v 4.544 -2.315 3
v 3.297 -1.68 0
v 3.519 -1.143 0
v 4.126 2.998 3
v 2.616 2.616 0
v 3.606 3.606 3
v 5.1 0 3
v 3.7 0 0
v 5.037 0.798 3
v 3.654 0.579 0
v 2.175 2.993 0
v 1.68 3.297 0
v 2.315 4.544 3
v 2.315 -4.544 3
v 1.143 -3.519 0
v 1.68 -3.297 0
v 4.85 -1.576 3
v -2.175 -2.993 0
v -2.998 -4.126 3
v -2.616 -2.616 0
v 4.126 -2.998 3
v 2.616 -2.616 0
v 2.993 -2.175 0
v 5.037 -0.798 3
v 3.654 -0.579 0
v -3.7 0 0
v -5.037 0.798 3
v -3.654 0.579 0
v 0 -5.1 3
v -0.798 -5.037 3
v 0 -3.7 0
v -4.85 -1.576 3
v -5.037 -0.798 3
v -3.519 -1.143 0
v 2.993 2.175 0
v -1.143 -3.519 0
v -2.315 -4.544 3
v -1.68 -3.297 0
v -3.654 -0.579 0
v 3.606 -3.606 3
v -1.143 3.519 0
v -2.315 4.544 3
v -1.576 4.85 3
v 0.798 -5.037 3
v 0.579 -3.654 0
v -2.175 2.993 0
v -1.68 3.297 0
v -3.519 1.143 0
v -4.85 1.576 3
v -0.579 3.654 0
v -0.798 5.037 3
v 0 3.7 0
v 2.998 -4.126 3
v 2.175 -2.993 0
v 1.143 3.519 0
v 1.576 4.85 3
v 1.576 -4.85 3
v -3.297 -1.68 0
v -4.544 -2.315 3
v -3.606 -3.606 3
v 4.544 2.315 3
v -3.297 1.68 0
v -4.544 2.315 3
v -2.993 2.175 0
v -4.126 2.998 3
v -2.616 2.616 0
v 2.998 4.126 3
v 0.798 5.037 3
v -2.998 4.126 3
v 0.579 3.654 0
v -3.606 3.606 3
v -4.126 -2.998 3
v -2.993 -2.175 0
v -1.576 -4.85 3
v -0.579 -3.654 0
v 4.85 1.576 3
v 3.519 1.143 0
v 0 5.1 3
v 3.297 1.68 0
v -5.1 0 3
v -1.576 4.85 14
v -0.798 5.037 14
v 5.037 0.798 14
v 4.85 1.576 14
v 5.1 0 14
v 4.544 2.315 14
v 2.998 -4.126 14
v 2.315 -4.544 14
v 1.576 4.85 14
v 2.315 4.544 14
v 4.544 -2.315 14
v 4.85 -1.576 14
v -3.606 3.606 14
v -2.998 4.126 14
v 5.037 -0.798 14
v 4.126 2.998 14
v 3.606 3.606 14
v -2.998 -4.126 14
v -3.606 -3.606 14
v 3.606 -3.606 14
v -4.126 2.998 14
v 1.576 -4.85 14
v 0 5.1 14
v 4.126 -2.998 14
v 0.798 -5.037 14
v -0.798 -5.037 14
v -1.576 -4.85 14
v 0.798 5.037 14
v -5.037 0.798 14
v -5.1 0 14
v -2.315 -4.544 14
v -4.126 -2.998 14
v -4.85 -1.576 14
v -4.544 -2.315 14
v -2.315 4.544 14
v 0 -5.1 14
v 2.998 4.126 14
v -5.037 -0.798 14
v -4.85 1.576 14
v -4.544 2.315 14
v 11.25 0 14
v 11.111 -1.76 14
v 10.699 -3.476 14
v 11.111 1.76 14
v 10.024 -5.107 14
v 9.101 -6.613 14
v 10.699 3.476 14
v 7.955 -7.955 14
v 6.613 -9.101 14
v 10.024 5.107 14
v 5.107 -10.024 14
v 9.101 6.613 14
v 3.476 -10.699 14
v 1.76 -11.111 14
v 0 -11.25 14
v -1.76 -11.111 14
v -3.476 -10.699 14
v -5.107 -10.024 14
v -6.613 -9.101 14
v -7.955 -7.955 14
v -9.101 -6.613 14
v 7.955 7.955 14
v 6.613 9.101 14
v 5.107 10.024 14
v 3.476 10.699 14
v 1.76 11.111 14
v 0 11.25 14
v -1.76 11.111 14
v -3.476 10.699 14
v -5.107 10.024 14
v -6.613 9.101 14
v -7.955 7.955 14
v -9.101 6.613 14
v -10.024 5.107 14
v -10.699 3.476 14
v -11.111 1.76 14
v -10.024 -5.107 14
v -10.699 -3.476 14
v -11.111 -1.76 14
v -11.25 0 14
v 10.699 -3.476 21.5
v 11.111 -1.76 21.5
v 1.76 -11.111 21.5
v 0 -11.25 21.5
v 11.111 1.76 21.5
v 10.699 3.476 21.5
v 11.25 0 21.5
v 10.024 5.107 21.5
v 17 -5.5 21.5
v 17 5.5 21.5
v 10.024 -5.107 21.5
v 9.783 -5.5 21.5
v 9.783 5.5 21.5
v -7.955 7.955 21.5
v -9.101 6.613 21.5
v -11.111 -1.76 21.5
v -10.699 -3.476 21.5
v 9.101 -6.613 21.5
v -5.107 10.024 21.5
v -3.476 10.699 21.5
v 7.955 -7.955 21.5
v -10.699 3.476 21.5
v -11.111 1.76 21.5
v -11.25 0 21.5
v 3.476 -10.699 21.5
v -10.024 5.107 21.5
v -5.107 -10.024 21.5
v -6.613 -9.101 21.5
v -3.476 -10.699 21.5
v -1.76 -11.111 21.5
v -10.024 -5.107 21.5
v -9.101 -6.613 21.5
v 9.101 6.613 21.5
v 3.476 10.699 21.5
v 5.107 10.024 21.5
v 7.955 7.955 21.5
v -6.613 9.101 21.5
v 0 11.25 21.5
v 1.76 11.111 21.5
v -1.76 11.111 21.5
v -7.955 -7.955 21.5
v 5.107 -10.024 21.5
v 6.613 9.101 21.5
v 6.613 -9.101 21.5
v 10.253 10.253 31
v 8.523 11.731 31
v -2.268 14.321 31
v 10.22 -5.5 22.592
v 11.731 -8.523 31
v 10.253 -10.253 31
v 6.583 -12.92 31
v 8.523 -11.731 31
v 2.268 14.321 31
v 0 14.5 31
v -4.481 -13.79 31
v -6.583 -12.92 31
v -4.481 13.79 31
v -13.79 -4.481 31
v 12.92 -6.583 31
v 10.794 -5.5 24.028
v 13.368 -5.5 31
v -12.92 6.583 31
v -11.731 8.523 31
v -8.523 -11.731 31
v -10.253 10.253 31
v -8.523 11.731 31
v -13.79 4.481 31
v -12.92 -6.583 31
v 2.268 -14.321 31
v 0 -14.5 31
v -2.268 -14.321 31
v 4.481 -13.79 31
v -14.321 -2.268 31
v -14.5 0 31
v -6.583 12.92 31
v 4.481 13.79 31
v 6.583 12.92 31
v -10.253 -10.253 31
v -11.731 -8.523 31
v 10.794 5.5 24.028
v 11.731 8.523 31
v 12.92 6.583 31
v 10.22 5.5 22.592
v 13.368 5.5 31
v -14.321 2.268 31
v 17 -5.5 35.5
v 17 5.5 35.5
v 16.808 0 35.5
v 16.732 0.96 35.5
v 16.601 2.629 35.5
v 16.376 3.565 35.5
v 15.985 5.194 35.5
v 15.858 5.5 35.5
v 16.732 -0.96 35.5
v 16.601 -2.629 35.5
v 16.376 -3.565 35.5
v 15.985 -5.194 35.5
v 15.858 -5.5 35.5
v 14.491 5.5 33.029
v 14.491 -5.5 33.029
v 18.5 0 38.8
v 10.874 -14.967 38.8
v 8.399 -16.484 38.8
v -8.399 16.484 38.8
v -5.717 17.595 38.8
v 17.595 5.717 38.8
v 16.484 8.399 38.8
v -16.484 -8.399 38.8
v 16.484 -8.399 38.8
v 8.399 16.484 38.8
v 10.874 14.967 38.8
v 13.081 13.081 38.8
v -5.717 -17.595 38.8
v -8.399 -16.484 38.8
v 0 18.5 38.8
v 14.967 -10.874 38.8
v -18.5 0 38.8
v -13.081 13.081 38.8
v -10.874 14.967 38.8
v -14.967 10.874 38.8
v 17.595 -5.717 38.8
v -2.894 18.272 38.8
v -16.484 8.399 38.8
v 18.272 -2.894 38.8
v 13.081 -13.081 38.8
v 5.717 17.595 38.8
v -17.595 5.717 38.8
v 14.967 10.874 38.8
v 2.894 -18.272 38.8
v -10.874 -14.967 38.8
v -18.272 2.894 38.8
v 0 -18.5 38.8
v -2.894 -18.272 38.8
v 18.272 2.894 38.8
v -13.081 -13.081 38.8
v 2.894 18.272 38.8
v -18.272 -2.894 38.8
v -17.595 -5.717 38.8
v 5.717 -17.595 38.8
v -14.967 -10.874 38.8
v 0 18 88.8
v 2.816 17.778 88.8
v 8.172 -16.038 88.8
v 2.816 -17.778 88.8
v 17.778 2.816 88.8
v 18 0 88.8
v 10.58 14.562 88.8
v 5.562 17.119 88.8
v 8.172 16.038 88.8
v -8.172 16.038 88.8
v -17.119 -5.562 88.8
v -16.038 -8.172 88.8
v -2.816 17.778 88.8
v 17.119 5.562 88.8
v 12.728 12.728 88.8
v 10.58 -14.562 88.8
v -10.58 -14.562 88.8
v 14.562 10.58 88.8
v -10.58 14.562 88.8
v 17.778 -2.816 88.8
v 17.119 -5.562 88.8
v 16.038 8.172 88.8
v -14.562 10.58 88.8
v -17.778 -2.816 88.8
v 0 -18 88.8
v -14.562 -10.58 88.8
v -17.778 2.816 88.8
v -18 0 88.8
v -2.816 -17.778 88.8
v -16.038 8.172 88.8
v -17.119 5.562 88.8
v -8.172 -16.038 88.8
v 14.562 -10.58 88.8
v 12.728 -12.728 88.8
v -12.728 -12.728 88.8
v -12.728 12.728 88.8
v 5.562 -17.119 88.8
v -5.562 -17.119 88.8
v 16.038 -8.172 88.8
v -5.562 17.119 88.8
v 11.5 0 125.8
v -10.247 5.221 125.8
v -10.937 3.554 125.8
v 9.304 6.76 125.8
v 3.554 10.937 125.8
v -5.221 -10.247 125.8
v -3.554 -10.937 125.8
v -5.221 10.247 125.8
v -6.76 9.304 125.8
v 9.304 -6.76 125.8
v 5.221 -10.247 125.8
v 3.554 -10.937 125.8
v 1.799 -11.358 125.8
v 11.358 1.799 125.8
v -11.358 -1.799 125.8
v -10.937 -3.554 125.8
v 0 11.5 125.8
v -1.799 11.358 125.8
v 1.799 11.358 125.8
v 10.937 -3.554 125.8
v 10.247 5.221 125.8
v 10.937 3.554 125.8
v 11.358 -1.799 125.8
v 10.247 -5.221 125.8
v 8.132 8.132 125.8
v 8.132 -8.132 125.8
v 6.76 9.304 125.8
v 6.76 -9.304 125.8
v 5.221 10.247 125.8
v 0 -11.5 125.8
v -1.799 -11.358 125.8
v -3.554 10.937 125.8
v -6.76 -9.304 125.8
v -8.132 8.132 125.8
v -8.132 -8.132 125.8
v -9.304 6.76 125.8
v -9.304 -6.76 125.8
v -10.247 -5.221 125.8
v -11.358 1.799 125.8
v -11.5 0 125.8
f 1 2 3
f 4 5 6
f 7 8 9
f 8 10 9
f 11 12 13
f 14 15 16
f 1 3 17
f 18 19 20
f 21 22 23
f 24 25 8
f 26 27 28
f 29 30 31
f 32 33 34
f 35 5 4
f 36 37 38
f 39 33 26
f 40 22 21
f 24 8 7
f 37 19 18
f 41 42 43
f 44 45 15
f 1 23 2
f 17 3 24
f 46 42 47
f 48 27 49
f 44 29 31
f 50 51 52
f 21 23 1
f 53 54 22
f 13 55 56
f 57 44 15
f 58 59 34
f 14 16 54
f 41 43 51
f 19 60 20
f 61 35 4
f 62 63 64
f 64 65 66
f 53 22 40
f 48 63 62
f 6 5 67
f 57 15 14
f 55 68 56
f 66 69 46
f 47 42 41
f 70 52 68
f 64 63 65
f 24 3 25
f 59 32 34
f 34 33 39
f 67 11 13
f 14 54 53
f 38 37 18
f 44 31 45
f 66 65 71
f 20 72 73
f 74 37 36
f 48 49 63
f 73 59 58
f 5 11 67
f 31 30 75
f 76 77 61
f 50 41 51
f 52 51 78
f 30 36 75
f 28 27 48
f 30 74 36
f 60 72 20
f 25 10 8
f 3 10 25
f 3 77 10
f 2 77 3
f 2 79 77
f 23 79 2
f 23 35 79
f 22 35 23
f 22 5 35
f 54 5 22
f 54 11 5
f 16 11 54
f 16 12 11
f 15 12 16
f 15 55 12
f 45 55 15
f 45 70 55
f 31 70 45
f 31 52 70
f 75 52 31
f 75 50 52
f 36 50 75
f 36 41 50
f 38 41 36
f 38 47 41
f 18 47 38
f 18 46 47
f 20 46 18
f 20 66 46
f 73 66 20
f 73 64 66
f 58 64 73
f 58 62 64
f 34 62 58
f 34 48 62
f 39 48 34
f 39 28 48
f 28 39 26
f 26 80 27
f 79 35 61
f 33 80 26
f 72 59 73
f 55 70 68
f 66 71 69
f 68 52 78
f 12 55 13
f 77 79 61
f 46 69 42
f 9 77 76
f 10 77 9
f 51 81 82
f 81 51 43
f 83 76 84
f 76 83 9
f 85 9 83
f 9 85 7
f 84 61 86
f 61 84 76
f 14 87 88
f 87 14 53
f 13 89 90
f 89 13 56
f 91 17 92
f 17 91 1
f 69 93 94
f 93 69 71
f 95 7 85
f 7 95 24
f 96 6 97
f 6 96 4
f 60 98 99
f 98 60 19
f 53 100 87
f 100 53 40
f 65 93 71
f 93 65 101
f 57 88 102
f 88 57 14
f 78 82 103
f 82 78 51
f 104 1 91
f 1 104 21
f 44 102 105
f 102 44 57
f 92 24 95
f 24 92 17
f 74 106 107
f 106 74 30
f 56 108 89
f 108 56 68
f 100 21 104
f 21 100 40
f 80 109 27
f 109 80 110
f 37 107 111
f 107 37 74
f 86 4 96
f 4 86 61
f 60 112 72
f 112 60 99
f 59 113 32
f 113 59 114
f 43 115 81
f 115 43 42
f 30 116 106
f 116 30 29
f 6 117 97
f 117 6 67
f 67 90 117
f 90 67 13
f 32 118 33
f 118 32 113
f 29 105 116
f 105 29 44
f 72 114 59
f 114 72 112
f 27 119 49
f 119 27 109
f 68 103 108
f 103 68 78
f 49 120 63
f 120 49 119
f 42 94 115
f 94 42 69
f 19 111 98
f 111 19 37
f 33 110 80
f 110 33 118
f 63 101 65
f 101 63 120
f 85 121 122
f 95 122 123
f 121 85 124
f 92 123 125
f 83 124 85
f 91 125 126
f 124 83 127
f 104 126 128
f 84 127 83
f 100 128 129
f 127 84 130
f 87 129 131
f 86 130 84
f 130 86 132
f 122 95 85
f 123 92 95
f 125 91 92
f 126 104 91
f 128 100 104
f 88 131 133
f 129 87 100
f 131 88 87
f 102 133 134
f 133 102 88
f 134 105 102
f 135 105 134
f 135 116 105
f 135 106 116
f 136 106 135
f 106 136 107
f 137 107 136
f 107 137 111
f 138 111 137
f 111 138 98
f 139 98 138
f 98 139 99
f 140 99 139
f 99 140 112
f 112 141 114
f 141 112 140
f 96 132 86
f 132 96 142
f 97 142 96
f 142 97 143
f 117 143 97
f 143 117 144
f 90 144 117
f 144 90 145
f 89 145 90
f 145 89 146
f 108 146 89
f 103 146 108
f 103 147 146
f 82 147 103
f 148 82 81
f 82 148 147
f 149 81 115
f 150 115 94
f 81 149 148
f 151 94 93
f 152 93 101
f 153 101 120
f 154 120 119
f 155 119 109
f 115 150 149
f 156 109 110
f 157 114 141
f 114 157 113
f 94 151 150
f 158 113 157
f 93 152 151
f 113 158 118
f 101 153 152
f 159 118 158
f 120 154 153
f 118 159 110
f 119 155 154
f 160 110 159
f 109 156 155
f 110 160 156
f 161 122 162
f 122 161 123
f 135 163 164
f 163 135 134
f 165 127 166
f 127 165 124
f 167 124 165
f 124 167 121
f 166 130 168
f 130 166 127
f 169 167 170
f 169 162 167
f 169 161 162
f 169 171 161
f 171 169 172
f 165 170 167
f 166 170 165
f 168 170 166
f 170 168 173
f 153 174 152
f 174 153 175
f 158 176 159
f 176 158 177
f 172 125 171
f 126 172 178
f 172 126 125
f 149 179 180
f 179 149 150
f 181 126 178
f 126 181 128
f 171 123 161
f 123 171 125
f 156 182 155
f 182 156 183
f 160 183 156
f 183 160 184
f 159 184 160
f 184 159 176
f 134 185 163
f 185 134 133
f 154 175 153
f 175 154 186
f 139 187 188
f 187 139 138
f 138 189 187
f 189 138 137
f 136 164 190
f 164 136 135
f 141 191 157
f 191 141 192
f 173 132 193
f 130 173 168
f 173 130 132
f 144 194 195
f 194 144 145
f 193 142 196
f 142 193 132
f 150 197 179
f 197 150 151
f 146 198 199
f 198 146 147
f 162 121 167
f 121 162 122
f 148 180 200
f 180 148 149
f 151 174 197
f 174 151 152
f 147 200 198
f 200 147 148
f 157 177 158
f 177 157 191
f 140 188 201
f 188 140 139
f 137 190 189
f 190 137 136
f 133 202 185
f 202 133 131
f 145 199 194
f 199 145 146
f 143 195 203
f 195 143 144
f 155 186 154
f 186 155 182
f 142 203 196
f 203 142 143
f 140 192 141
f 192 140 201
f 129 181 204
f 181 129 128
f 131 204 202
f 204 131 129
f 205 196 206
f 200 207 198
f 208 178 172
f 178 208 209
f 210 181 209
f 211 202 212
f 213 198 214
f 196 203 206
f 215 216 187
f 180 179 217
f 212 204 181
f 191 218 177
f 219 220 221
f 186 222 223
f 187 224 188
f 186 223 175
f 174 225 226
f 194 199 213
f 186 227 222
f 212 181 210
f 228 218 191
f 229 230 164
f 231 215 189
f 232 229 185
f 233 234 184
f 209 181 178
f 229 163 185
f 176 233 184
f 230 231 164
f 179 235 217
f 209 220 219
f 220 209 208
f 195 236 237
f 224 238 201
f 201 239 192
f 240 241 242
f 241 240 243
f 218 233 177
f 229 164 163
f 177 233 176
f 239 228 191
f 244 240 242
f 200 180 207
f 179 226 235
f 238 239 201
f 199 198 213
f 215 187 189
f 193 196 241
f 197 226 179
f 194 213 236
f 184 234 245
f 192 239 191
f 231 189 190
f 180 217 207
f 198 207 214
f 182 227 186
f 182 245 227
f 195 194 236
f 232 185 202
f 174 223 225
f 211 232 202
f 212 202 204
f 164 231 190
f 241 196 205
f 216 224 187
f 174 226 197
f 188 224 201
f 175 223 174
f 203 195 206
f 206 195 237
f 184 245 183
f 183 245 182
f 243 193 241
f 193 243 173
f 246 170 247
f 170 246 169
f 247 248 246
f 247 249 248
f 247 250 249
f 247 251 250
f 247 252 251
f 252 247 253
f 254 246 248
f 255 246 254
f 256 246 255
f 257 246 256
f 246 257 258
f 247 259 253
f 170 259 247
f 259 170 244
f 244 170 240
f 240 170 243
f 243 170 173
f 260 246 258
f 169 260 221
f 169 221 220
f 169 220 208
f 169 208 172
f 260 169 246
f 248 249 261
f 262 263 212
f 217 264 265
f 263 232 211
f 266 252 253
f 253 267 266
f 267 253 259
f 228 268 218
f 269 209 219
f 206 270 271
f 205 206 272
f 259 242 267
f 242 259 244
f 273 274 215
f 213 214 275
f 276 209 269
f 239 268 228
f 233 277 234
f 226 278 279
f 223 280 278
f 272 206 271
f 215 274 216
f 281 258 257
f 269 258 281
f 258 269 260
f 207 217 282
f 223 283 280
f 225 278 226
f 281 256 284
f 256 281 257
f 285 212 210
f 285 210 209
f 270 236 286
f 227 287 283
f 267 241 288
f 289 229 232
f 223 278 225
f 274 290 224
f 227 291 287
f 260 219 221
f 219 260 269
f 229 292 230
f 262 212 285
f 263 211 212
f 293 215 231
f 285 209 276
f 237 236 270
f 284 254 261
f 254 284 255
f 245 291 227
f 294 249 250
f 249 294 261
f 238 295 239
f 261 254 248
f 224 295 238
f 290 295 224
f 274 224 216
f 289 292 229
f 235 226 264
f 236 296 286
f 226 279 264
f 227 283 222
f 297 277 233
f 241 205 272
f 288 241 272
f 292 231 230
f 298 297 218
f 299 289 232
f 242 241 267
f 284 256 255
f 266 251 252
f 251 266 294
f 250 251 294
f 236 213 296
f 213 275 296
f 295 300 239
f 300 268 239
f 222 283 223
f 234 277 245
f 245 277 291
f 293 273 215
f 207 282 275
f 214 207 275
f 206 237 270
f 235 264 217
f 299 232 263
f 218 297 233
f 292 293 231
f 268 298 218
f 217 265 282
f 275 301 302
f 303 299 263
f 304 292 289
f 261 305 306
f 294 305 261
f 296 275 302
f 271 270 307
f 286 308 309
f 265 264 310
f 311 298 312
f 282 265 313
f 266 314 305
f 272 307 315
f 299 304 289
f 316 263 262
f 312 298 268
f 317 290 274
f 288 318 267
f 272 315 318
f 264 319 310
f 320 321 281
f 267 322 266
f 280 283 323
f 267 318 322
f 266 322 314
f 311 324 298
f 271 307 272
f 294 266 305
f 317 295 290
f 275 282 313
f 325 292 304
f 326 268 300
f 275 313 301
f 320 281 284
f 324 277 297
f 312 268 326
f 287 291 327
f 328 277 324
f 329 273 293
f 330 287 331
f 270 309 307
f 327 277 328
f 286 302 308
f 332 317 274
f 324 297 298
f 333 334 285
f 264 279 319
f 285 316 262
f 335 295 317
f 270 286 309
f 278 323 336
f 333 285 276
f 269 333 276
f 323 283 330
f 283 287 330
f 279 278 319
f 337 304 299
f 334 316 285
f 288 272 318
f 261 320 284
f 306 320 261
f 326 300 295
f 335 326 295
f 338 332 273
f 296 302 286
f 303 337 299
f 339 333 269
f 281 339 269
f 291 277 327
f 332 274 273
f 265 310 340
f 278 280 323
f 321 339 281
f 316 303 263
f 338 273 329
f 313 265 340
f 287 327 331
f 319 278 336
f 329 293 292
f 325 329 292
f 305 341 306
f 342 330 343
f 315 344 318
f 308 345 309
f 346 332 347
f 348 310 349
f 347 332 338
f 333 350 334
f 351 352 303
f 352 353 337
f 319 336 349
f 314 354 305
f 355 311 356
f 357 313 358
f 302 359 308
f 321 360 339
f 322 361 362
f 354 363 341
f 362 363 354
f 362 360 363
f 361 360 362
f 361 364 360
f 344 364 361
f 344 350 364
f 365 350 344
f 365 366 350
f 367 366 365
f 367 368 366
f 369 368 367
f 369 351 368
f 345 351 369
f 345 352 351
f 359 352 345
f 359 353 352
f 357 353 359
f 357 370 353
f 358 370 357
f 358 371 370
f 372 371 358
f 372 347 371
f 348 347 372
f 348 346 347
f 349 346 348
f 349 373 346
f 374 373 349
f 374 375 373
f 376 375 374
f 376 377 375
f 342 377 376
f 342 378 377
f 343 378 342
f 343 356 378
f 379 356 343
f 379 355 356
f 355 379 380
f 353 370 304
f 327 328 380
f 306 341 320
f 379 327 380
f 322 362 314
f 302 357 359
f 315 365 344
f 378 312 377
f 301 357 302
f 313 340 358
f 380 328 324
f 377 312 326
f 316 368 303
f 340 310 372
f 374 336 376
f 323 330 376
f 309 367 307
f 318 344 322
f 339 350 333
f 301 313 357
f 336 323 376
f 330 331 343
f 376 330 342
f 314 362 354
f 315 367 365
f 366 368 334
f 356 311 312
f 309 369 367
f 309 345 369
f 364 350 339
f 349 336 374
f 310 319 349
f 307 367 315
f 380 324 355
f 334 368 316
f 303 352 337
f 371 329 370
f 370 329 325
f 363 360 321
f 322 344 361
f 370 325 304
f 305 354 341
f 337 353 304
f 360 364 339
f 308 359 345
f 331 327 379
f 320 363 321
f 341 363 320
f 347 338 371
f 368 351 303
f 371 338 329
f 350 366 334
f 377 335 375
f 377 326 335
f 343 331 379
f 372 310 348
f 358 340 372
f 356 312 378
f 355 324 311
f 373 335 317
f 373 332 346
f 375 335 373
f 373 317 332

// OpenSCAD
// file: cnc_params.scad
$fn = 40;

wall = 3;

rod_d = 12;
rod_sz = 152;
rod_bearing_d = 21;
rod_bearing_sz = 30;
rod_rod_dist = 34+rod_bearing_d;
rod_bearing_pos_z = [15+12/2, 15 + 12/2 + rod_rod_dist + 12/2];
lead_screw_d = 8;
lead_screw_bearing_d = 22;
lead_screw_bearing_sz = 7;
lead_screw_nut_d = 10.6;
lead_screw_nut_pos_z = rod_bearing_pos_z[0] + 20.5 + 8/2 + 12/2;
lead_screw_nut_hole_d = 2.4;
lead_screw_nut_hole_r_dist = 8;
lead_screw_nut_attach_plate_d = 22.4;

echo("rod 1-lead ", lead_screw_nut_pos_z-rod_bearing_pos_z[0], ", lead to  rod2 ", lead_screw_nut_pos_z - rod_bearing_pos_z[1]);

base_sz_x = rod_bearing_sz * 2 + 2 * wall;
base_sz_y = rod_bearing_d + 6; // shortest
base_sz_z = rod_sz+wall*2;

//28 65
echo("base x: ", base_sz_x, ", base y:", base_sz_y);

hole_d = 3.8;
hole_d_through = 4.8;
mounting_hole_offset = 5;

motor_sz = 43;
motor_d = 24;
motor_hole_dist = 30.2;
rod_distance = 66.2 - rod_bearing_d; //rod_distance/2 = 23.25??? (66.2 - 21)/2 = 45.2/2 = 22.6 !!!
// motor shift from rod axis
motor_shift_y = 5;

top_block_sz_x = base_sz_x + 2 * wall;
top_block_sz_y = motor_sz + 4 * wall + base_sz_y;
top_block_sz_z = 10;

bottom_block_sz_x = top_block_sz_x;
bottom_block_sz_y = top_block_sz_y - 10;
bottom_block_sz_z = lead_screw_bearing_sz + wall;

// ganztry_z params

gantry_sz_x = base_sz_x;
gantry_sz_y = rod_bearing_d + 2 * wall;
gantry_sz_z = rod_bearing_sz * 2 + 4;

attach_sz_x = 4;
attach_sz_y = 25;
attach_sz_z = gantry_sz_z-10;

extract_sz_x = lead_screw_nut_attach_plate_d + 2 * wall;
extract_sz_y = extract_sz_x;
extract_sz_z = gantry_sz_z - 15;

rod_dist_x = 67.4 - rod_bearing_d;

attach_side_gap = 0.5;

//////////////////////// duratech drill maket
top_d = 23;
top_sz_z = 37;
above_widest_level_d = 36;
above_widest_level_sz_z = 50;
widest_level_d = 37;
widest_level_sz_z = 7.8;

above_bottom_box_sz_x = 17;
above_bottom_box_sz_y = 11;
above_bottom_box_sz_z = 14;

above_bottom_d = 29;
above_bottom_sz_z = 9.5;
bottom_d = 22.5;
bottom_sz_z = 7.5;

metal_thing_d  = 10.2;
metal_thing_sz_z = 11;
metal_cone_bottom_d = 7.4;
metal_cone_bottom_sz_z = 3;

//////////////////////////
// main file
include <cnc_params.scad>
$fn = 40;

module duratech_maket() {
	translate([0, 0, metal_cone_bottom_sz_z/2]) {
		cylinder(d1=metal_cone_bottom_d, d2=metal_thing_d, h=metal_cone_bottom_sz_z, center=true);
	}
	translate([0, 0, metal_cone_bottom_sz_z+metal_thing_sz_z/2]) {
		cylinder(d=metal_thing_d, h=metal_thing_sz_z, center=true);
	}
	translate([0, 0, metal_cone_bottom_sz_z+metal_thing_sz_z+bottom_sz_z/2]) {
		cylinder(d=bottom_d, h=bottom_sz_z, center=true);
	}
	translate([0, 0, metal_cone_bottom_sz_z+metal_thing_sz_z+bottom_sz_z+above_bottom_sz_z/2]) {
		cylinder(d1=bottom_d, d2=above_bottom_d, h=above_bottom_sz_z, center=true);
	}
	translate([above_bottom_box_sz_x/2, 0, metal_cone_bottom_sz_z+metal_thing_sz_z+bottom_sz_z+above_bottom_box_sz_z/2]) {
		cube([above_bottom_box_sz_x, above_bottom_box_sz_y, above_bottom_box_sz_z], center=true);
	}
	translate([0, 0, metal_cone_bottom_sz_z+metal_thing_sz_z+bottom_sz_z+above_bottom_sz_z+widest_level_sz_z/2]) {
		cylinder(d1=above_bottom_d, d2=widest_level_d, h=widest_level_sz_z, center=true);
	}
	translate([0, 0, metal_cone_bottom_sz_z+metal_thing_sz_z+bottom_sz_z+
				above_bottom_sz_z+widest_level_sz_z+above_widest_level_sz_z/2]) {
		cylinder(d1=widest_level_d, d2=above_widest_level_d, h=above_widest_level_sz_z, center=true);
	}
	translate([0, 0, metal_cone_bottom_sz_z+metal_thing_sz_z+bottom_sz_z+
				above_bottom_sz_z+widest_level_sz_z+above_widest_level_sz_z+top_sz_z/2]) {
		cylinder(d1=above_widest_level_d, d2=top_d, h=top_sz_z, center=true);
	}
}

duratech_maket();
